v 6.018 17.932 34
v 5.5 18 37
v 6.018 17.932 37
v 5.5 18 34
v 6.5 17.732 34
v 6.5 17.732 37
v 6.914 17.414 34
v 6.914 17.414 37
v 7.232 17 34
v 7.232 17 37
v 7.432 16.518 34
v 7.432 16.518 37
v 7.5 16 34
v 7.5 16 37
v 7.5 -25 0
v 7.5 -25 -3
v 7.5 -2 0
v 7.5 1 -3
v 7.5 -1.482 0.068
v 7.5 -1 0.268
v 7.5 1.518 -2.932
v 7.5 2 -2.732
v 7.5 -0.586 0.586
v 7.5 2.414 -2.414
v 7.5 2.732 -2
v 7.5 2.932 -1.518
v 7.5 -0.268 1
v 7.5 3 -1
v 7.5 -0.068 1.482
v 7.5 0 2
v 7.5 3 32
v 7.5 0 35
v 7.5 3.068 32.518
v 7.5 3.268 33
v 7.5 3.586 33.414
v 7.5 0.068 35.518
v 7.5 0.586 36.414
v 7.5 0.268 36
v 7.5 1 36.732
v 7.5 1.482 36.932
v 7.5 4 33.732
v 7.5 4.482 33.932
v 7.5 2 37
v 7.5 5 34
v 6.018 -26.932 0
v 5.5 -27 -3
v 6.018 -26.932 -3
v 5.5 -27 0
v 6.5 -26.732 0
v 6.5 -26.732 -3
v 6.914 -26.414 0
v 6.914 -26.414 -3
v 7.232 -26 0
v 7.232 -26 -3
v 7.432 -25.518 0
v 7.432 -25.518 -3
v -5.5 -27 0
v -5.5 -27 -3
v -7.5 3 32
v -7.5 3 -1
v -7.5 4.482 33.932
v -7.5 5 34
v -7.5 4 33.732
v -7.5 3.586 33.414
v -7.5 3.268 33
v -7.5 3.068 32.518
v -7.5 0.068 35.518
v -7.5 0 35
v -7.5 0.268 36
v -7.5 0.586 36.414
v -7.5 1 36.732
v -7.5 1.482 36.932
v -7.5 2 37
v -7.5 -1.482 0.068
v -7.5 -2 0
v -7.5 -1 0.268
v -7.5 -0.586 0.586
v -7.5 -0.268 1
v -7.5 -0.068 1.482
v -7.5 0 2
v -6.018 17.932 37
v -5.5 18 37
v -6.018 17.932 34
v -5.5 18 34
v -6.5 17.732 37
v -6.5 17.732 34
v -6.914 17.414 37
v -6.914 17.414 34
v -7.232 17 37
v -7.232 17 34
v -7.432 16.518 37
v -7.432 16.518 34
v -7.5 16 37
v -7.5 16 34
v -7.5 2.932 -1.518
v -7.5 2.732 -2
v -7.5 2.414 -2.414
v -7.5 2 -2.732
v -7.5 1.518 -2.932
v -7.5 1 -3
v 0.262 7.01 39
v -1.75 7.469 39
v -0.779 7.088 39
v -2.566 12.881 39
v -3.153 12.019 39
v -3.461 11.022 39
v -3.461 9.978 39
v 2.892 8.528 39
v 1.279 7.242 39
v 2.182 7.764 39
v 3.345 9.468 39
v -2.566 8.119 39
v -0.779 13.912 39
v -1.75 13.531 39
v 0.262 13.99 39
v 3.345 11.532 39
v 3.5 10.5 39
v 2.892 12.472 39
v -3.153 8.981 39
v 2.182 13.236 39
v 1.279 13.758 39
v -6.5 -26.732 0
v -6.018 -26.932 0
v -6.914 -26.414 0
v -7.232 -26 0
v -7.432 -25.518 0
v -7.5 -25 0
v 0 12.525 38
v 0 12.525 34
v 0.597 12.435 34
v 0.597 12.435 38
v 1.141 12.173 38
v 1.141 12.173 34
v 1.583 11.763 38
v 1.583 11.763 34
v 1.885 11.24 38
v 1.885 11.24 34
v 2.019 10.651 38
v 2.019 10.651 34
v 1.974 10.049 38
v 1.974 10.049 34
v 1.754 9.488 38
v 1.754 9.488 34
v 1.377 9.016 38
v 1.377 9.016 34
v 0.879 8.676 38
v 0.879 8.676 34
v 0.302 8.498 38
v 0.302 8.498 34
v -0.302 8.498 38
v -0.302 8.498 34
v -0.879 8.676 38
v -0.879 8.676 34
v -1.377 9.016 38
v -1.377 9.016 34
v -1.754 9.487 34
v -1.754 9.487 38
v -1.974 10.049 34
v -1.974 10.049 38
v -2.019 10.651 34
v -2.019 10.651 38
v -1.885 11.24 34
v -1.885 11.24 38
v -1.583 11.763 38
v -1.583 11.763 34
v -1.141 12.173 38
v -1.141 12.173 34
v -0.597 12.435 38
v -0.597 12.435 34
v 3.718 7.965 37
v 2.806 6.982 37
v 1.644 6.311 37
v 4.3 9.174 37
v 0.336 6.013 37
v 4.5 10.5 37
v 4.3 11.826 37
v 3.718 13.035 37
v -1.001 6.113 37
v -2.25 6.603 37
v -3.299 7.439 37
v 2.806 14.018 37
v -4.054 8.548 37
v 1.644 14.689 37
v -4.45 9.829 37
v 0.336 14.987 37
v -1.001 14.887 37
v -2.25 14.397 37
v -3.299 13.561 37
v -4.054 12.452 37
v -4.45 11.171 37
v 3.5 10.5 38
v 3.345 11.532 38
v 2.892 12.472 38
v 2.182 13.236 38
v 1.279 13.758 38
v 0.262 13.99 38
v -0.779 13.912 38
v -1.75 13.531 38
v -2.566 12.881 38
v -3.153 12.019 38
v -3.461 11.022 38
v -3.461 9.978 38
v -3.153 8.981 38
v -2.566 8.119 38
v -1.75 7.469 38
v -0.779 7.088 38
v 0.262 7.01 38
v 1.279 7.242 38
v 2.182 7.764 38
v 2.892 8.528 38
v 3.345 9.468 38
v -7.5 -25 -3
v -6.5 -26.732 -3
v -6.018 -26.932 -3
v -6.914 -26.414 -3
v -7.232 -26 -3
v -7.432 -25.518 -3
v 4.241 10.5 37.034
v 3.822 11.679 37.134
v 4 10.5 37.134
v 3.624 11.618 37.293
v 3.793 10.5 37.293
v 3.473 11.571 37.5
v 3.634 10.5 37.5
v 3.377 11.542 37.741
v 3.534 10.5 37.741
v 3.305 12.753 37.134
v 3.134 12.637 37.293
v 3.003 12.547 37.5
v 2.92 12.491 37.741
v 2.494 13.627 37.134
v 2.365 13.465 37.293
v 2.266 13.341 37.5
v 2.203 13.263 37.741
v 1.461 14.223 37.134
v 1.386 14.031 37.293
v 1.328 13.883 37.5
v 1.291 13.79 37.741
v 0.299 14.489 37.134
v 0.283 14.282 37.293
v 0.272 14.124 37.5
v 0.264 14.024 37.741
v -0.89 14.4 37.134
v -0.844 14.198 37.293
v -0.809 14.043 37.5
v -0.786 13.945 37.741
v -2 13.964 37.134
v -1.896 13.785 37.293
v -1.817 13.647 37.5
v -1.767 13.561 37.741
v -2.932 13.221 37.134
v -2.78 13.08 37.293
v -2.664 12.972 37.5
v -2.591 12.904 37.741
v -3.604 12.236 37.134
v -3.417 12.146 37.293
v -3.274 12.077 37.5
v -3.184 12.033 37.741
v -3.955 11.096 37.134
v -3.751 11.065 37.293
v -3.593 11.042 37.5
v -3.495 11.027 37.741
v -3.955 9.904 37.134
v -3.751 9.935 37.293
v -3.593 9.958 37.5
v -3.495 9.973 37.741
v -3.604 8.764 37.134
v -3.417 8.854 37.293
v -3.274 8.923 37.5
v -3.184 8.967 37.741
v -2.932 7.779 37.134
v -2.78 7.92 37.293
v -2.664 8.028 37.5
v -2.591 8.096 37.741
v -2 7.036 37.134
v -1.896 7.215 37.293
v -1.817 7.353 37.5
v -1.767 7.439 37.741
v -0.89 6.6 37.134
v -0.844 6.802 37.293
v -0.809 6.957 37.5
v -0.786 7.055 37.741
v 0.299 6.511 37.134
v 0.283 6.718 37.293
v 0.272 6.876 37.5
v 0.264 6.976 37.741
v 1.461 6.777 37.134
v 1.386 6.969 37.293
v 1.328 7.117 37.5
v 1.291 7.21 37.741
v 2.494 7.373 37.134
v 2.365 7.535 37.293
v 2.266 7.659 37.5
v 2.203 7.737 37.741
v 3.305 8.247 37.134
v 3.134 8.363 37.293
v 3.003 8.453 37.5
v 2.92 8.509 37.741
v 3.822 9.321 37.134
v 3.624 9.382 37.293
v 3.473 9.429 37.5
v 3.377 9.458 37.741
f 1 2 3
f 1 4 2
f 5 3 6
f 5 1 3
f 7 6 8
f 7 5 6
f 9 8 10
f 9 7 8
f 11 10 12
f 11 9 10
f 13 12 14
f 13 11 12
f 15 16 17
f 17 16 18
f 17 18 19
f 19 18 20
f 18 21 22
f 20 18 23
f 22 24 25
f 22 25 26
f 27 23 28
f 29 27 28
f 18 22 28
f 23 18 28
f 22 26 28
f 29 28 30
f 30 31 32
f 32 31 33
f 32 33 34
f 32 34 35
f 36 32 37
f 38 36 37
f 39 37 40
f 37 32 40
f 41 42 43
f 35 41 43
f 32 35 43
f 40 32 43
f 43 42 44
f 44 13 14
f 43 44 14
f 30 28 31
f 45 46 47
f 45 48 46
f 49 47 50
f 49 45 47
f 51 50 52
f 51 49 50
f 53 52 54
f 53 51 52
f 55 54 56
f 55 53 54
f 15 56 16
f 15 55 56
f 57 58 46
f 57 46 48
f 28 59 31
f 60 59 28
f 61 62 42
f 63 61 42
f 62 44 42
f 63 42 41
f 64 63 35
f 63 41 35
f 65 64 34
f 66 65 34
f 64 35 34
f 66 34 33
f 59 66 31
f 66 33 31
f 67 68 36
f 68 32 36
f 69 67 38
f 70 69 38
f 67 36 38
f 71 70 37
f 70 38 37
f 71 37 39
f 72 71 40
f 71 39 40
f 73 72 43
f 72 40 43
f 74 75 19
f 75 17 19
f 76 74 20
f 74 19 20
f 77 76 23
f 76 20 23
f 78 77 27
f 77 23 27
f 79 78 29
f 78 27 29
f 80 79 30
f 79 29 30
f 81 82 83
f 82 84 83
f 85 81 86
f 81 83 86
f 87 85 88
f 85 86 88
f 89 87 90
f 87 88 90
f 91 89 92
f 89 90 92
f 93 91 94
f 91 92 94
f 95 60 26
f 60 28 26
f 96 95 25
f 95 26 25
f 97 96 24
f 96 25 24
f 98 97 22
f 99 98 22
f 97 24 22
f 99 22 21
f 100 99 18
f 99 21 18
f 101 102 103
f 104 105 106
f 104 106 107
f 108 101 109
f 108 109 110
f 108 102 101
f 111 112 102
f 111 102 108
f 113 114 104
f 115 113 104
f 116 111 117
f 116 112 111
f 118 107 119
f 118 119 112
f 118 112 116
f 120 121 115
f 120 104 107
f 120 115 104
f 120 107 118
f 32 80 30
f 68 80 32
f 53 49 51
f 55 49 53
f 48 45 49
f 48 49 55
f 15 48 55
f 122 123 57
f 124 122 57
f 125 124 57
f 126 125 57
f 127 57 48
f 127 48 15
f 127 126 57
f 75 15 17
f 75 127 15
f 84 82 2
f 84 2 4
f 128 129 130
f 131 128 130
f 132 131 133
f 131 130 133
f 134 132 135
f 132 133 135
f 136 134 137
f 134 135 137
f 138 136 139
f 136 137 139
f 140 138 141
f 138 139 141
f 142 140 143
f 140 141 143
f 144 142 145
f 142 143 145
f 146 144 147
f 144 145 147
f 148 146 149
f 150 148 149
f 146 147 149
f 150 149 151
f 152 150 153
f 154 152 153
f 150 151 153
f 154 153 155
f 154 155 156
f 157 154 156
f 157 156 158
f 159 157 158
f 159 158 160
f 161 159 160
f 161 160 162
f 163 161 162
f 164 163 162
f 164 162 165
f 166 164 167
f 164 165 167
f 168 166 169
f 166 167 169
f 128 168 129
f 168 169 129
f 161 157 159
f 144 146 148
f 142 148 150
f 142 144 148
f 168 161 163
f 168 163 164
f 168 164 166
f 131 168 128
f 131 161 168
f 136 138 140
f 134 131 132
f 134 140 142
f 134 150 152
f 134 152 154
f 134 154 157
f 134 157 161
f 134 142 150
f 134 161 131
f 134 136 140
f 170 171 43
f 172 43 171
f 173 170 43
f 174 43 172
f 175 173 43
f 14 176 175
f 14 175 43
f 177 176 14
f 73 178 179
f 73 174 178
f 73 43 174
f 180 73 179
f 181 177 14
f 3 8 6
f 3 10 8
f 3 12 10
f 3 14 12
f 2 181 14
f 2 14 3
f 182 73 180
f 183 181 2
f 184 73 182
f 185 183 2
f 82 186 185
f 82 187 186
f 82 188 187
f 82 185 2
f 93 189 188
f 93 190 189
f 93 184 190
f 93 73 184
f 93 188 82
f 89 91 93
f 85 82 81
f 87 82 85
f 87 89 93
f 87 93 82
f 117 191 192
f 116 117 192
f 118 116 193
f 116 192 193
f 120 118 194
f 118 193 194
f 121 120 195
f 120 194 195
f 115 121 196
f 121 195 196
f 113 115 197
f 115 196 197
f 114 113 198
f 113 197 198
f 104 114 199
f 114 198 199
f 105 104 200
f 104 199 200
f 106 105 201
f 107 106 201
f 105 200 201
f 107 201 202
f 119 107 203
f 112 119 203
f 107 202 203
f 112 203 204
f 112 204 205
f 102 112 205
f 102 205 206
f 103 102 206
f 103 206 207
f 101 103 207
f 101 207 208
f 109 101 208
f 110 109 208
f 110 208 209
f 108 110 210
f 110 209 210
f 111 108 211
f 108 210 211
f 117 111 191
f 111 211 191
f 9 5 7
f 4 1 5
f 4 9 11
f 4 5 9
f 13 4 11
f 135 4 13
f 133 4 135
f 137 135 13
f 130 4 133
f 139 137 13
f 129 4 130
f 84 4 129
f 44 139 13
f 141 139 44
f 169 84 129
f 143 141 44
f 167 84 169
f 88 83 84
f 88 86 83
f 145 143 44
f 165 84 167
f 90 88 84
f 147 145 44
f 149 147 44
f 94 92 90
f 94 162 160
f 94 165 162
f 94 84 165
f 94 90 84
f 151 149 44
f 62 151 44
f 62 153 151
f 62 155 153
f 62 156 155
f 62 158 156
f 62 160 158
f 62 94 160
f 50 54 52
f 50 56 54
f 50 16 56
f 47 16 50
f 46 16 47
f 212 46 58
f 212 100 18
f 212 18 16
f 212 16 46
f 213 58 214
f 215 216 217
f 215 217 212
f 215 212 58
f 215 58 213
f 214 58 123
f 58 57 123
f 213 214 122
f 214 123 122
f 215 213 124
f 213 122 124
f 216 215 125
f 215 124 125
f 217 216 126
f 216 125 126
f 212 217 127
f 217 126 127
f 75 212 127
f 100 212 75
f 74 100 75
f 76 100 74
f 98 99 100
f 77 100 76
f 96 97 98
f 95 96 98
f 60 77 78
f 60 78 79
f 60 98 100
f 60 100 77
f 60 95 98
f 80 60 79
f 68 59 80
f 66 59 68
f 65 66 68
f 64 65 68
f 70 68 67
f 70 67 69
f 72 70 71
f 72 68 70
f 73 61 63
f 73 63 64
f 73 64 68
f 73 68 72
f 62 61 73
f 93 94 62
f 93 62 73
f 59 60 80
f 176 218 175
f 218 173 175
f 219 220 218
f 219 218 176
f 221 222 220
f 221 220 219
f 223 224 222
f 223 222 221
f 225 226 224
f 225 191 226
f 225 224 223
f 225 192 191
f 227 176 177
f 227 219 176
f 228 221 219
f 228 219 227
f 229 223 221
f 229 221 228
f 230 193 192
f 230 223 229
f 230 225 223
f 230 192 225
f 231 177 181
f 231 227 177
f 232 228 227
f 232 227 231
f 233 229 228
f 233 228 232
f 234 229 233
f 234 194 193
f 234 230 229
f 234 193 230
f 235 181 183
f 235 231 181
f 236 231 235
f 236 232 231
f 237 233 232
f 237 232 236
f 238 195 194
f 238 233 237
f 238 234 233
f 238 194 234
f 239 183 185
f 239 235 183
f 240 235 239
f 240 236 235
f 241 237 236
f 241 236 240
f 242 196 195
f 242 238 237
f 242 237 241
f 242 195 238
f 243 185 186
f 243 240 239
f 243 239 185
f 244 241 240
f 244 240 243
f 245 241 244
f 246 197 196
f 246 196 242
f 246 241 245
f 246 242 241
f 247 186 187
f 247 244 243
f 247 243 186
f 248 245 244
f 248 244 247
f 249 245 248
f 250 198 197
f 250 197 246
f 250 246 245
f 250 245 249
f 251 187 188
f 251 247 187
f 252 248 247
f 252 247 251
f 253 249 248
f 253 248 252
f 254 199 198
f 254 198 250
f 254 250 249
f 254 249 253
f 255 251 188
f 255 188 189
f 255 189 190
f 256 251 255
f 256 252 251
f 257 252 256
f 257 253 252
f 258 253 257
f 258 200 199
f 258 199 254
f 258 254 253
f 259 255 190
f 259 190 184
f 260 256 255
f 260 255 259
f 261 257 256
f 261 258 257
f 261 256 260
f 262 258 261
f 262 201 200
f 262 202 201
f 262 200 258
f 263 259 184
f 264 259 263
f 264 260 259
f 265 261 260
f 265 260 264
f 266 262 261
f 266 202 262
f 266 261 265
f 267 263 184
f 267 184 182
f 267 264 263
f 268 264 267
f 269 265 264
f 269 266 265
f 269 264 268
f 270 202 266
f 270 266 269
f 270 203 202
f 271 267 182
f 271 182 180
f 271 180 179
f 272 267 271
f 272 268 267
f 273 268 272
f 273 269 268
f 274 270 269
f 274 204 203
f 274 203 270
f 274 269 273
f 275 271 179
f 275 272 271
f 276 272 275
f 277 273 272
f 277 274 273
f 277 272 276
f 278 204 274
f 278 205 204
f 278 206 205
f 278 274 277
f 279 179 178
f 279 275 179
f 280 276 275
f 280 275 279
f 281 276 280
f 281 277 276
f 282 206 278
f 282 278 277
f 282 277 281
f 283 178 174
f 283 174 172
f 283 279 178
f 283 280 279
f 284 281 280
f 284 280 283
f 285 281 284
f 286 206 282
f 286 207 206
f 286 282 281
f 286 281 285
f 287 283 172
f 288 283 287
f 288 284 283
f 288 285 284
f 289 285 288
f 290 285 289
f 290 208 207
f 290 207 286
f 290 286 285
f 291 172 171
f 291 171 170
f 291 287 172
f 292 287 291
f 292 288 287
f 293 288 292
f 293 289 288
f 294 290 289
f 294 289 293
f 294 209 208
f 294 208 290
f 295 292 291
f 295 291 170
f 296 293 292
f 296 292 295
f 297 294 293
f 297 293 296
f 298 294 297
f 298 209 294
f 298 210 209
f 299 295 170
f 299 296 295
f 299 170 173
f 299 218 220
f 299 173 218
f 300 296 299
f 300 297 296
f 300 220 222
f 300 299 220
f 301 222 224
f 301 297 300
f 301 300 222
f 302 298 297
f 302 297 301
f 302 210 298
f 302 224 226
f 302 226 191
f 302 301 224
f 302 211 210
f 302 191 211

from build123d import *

# Parameters (mm, degrees)
EXTRUDE_1_DEPTH      = 7.5
EXTRUDE_1_DEPTH_BACK = 7.5
FILLET_1_R           = 2
SKETCH_2_R           = 3.5
EXTRUDE_3_DEPTH      = 2
SKETCH_4_R           = 2.025
CUT_EXTRUDE_1_DEPTH  = 4
FILLET_2_R           = 1


with BuildPart() as part:
    # 草圖1 → 填料-伸長1 (new, two sides: drawn at the far end of the back side and taken through both)
    with BuildSketch(Plane(origin=(0, 0, 0), x_dir=(0, 0, -1), z_dir=(1, 0, 0)).offset(-EXTRUDE_1_DEPTH_BACK)):
        Polygon((-34, 18), (-34, 3), (3, 3), (3, -27), (0, -27), (0, 0), (-37, 0), (-37, 18), align=None)
    extrude(amount=EXTRUDE_1_DEPTH + EXTRUDE_1_DEPTH_BACK)

    # 圓角1
    fillet_1_edges = [part.edges().sort_by_distance(p)[0] for p in [
        (-7.5, -27, -1.5),
        (7.5, -27, -1.5),
        (-7.5, 18, 35.5),
        (7.5, 18, 35.5),
        (0, 3, -3),
        (0, 3, 34),
        (0, 0, 37),
        (0, 0, 0),
    ]]
    fillet(fillet_1_edges, radius=FILLET_1_R)

    # 草圖2 → 填料-伸長3 (add)
    with BuildSketch(Plane.XY.offset(37)):
        with Locations((0, 10.5)):
            Circle(SKETCH_2_R)
    extrude(amount=EXTRUDE_3_DEPTH)

    # 草圖4 → 除料-伸長1 (cut)
    with BuildSketch(Plane(origin=(0, 0, 34), x_dir=(-1, 0, 0), z_dir=(0, 0, -1))):
        with Locations((0, 10.5)):
            Circle(SKETCH_4_R)
    extrude(amount=-CUT_EXTRUDE_1_DEPTH, mode=Mode.SUBTRACT)

    # 圓角2
    fillet_2_edges = [part.edges().sort_by_distance(p)[0] for p in [
        (-3.5, 10.5, 37),
    ]]
    fillet(fillet_2_edges, radius=FILLET_2_R)


solid = part.part
